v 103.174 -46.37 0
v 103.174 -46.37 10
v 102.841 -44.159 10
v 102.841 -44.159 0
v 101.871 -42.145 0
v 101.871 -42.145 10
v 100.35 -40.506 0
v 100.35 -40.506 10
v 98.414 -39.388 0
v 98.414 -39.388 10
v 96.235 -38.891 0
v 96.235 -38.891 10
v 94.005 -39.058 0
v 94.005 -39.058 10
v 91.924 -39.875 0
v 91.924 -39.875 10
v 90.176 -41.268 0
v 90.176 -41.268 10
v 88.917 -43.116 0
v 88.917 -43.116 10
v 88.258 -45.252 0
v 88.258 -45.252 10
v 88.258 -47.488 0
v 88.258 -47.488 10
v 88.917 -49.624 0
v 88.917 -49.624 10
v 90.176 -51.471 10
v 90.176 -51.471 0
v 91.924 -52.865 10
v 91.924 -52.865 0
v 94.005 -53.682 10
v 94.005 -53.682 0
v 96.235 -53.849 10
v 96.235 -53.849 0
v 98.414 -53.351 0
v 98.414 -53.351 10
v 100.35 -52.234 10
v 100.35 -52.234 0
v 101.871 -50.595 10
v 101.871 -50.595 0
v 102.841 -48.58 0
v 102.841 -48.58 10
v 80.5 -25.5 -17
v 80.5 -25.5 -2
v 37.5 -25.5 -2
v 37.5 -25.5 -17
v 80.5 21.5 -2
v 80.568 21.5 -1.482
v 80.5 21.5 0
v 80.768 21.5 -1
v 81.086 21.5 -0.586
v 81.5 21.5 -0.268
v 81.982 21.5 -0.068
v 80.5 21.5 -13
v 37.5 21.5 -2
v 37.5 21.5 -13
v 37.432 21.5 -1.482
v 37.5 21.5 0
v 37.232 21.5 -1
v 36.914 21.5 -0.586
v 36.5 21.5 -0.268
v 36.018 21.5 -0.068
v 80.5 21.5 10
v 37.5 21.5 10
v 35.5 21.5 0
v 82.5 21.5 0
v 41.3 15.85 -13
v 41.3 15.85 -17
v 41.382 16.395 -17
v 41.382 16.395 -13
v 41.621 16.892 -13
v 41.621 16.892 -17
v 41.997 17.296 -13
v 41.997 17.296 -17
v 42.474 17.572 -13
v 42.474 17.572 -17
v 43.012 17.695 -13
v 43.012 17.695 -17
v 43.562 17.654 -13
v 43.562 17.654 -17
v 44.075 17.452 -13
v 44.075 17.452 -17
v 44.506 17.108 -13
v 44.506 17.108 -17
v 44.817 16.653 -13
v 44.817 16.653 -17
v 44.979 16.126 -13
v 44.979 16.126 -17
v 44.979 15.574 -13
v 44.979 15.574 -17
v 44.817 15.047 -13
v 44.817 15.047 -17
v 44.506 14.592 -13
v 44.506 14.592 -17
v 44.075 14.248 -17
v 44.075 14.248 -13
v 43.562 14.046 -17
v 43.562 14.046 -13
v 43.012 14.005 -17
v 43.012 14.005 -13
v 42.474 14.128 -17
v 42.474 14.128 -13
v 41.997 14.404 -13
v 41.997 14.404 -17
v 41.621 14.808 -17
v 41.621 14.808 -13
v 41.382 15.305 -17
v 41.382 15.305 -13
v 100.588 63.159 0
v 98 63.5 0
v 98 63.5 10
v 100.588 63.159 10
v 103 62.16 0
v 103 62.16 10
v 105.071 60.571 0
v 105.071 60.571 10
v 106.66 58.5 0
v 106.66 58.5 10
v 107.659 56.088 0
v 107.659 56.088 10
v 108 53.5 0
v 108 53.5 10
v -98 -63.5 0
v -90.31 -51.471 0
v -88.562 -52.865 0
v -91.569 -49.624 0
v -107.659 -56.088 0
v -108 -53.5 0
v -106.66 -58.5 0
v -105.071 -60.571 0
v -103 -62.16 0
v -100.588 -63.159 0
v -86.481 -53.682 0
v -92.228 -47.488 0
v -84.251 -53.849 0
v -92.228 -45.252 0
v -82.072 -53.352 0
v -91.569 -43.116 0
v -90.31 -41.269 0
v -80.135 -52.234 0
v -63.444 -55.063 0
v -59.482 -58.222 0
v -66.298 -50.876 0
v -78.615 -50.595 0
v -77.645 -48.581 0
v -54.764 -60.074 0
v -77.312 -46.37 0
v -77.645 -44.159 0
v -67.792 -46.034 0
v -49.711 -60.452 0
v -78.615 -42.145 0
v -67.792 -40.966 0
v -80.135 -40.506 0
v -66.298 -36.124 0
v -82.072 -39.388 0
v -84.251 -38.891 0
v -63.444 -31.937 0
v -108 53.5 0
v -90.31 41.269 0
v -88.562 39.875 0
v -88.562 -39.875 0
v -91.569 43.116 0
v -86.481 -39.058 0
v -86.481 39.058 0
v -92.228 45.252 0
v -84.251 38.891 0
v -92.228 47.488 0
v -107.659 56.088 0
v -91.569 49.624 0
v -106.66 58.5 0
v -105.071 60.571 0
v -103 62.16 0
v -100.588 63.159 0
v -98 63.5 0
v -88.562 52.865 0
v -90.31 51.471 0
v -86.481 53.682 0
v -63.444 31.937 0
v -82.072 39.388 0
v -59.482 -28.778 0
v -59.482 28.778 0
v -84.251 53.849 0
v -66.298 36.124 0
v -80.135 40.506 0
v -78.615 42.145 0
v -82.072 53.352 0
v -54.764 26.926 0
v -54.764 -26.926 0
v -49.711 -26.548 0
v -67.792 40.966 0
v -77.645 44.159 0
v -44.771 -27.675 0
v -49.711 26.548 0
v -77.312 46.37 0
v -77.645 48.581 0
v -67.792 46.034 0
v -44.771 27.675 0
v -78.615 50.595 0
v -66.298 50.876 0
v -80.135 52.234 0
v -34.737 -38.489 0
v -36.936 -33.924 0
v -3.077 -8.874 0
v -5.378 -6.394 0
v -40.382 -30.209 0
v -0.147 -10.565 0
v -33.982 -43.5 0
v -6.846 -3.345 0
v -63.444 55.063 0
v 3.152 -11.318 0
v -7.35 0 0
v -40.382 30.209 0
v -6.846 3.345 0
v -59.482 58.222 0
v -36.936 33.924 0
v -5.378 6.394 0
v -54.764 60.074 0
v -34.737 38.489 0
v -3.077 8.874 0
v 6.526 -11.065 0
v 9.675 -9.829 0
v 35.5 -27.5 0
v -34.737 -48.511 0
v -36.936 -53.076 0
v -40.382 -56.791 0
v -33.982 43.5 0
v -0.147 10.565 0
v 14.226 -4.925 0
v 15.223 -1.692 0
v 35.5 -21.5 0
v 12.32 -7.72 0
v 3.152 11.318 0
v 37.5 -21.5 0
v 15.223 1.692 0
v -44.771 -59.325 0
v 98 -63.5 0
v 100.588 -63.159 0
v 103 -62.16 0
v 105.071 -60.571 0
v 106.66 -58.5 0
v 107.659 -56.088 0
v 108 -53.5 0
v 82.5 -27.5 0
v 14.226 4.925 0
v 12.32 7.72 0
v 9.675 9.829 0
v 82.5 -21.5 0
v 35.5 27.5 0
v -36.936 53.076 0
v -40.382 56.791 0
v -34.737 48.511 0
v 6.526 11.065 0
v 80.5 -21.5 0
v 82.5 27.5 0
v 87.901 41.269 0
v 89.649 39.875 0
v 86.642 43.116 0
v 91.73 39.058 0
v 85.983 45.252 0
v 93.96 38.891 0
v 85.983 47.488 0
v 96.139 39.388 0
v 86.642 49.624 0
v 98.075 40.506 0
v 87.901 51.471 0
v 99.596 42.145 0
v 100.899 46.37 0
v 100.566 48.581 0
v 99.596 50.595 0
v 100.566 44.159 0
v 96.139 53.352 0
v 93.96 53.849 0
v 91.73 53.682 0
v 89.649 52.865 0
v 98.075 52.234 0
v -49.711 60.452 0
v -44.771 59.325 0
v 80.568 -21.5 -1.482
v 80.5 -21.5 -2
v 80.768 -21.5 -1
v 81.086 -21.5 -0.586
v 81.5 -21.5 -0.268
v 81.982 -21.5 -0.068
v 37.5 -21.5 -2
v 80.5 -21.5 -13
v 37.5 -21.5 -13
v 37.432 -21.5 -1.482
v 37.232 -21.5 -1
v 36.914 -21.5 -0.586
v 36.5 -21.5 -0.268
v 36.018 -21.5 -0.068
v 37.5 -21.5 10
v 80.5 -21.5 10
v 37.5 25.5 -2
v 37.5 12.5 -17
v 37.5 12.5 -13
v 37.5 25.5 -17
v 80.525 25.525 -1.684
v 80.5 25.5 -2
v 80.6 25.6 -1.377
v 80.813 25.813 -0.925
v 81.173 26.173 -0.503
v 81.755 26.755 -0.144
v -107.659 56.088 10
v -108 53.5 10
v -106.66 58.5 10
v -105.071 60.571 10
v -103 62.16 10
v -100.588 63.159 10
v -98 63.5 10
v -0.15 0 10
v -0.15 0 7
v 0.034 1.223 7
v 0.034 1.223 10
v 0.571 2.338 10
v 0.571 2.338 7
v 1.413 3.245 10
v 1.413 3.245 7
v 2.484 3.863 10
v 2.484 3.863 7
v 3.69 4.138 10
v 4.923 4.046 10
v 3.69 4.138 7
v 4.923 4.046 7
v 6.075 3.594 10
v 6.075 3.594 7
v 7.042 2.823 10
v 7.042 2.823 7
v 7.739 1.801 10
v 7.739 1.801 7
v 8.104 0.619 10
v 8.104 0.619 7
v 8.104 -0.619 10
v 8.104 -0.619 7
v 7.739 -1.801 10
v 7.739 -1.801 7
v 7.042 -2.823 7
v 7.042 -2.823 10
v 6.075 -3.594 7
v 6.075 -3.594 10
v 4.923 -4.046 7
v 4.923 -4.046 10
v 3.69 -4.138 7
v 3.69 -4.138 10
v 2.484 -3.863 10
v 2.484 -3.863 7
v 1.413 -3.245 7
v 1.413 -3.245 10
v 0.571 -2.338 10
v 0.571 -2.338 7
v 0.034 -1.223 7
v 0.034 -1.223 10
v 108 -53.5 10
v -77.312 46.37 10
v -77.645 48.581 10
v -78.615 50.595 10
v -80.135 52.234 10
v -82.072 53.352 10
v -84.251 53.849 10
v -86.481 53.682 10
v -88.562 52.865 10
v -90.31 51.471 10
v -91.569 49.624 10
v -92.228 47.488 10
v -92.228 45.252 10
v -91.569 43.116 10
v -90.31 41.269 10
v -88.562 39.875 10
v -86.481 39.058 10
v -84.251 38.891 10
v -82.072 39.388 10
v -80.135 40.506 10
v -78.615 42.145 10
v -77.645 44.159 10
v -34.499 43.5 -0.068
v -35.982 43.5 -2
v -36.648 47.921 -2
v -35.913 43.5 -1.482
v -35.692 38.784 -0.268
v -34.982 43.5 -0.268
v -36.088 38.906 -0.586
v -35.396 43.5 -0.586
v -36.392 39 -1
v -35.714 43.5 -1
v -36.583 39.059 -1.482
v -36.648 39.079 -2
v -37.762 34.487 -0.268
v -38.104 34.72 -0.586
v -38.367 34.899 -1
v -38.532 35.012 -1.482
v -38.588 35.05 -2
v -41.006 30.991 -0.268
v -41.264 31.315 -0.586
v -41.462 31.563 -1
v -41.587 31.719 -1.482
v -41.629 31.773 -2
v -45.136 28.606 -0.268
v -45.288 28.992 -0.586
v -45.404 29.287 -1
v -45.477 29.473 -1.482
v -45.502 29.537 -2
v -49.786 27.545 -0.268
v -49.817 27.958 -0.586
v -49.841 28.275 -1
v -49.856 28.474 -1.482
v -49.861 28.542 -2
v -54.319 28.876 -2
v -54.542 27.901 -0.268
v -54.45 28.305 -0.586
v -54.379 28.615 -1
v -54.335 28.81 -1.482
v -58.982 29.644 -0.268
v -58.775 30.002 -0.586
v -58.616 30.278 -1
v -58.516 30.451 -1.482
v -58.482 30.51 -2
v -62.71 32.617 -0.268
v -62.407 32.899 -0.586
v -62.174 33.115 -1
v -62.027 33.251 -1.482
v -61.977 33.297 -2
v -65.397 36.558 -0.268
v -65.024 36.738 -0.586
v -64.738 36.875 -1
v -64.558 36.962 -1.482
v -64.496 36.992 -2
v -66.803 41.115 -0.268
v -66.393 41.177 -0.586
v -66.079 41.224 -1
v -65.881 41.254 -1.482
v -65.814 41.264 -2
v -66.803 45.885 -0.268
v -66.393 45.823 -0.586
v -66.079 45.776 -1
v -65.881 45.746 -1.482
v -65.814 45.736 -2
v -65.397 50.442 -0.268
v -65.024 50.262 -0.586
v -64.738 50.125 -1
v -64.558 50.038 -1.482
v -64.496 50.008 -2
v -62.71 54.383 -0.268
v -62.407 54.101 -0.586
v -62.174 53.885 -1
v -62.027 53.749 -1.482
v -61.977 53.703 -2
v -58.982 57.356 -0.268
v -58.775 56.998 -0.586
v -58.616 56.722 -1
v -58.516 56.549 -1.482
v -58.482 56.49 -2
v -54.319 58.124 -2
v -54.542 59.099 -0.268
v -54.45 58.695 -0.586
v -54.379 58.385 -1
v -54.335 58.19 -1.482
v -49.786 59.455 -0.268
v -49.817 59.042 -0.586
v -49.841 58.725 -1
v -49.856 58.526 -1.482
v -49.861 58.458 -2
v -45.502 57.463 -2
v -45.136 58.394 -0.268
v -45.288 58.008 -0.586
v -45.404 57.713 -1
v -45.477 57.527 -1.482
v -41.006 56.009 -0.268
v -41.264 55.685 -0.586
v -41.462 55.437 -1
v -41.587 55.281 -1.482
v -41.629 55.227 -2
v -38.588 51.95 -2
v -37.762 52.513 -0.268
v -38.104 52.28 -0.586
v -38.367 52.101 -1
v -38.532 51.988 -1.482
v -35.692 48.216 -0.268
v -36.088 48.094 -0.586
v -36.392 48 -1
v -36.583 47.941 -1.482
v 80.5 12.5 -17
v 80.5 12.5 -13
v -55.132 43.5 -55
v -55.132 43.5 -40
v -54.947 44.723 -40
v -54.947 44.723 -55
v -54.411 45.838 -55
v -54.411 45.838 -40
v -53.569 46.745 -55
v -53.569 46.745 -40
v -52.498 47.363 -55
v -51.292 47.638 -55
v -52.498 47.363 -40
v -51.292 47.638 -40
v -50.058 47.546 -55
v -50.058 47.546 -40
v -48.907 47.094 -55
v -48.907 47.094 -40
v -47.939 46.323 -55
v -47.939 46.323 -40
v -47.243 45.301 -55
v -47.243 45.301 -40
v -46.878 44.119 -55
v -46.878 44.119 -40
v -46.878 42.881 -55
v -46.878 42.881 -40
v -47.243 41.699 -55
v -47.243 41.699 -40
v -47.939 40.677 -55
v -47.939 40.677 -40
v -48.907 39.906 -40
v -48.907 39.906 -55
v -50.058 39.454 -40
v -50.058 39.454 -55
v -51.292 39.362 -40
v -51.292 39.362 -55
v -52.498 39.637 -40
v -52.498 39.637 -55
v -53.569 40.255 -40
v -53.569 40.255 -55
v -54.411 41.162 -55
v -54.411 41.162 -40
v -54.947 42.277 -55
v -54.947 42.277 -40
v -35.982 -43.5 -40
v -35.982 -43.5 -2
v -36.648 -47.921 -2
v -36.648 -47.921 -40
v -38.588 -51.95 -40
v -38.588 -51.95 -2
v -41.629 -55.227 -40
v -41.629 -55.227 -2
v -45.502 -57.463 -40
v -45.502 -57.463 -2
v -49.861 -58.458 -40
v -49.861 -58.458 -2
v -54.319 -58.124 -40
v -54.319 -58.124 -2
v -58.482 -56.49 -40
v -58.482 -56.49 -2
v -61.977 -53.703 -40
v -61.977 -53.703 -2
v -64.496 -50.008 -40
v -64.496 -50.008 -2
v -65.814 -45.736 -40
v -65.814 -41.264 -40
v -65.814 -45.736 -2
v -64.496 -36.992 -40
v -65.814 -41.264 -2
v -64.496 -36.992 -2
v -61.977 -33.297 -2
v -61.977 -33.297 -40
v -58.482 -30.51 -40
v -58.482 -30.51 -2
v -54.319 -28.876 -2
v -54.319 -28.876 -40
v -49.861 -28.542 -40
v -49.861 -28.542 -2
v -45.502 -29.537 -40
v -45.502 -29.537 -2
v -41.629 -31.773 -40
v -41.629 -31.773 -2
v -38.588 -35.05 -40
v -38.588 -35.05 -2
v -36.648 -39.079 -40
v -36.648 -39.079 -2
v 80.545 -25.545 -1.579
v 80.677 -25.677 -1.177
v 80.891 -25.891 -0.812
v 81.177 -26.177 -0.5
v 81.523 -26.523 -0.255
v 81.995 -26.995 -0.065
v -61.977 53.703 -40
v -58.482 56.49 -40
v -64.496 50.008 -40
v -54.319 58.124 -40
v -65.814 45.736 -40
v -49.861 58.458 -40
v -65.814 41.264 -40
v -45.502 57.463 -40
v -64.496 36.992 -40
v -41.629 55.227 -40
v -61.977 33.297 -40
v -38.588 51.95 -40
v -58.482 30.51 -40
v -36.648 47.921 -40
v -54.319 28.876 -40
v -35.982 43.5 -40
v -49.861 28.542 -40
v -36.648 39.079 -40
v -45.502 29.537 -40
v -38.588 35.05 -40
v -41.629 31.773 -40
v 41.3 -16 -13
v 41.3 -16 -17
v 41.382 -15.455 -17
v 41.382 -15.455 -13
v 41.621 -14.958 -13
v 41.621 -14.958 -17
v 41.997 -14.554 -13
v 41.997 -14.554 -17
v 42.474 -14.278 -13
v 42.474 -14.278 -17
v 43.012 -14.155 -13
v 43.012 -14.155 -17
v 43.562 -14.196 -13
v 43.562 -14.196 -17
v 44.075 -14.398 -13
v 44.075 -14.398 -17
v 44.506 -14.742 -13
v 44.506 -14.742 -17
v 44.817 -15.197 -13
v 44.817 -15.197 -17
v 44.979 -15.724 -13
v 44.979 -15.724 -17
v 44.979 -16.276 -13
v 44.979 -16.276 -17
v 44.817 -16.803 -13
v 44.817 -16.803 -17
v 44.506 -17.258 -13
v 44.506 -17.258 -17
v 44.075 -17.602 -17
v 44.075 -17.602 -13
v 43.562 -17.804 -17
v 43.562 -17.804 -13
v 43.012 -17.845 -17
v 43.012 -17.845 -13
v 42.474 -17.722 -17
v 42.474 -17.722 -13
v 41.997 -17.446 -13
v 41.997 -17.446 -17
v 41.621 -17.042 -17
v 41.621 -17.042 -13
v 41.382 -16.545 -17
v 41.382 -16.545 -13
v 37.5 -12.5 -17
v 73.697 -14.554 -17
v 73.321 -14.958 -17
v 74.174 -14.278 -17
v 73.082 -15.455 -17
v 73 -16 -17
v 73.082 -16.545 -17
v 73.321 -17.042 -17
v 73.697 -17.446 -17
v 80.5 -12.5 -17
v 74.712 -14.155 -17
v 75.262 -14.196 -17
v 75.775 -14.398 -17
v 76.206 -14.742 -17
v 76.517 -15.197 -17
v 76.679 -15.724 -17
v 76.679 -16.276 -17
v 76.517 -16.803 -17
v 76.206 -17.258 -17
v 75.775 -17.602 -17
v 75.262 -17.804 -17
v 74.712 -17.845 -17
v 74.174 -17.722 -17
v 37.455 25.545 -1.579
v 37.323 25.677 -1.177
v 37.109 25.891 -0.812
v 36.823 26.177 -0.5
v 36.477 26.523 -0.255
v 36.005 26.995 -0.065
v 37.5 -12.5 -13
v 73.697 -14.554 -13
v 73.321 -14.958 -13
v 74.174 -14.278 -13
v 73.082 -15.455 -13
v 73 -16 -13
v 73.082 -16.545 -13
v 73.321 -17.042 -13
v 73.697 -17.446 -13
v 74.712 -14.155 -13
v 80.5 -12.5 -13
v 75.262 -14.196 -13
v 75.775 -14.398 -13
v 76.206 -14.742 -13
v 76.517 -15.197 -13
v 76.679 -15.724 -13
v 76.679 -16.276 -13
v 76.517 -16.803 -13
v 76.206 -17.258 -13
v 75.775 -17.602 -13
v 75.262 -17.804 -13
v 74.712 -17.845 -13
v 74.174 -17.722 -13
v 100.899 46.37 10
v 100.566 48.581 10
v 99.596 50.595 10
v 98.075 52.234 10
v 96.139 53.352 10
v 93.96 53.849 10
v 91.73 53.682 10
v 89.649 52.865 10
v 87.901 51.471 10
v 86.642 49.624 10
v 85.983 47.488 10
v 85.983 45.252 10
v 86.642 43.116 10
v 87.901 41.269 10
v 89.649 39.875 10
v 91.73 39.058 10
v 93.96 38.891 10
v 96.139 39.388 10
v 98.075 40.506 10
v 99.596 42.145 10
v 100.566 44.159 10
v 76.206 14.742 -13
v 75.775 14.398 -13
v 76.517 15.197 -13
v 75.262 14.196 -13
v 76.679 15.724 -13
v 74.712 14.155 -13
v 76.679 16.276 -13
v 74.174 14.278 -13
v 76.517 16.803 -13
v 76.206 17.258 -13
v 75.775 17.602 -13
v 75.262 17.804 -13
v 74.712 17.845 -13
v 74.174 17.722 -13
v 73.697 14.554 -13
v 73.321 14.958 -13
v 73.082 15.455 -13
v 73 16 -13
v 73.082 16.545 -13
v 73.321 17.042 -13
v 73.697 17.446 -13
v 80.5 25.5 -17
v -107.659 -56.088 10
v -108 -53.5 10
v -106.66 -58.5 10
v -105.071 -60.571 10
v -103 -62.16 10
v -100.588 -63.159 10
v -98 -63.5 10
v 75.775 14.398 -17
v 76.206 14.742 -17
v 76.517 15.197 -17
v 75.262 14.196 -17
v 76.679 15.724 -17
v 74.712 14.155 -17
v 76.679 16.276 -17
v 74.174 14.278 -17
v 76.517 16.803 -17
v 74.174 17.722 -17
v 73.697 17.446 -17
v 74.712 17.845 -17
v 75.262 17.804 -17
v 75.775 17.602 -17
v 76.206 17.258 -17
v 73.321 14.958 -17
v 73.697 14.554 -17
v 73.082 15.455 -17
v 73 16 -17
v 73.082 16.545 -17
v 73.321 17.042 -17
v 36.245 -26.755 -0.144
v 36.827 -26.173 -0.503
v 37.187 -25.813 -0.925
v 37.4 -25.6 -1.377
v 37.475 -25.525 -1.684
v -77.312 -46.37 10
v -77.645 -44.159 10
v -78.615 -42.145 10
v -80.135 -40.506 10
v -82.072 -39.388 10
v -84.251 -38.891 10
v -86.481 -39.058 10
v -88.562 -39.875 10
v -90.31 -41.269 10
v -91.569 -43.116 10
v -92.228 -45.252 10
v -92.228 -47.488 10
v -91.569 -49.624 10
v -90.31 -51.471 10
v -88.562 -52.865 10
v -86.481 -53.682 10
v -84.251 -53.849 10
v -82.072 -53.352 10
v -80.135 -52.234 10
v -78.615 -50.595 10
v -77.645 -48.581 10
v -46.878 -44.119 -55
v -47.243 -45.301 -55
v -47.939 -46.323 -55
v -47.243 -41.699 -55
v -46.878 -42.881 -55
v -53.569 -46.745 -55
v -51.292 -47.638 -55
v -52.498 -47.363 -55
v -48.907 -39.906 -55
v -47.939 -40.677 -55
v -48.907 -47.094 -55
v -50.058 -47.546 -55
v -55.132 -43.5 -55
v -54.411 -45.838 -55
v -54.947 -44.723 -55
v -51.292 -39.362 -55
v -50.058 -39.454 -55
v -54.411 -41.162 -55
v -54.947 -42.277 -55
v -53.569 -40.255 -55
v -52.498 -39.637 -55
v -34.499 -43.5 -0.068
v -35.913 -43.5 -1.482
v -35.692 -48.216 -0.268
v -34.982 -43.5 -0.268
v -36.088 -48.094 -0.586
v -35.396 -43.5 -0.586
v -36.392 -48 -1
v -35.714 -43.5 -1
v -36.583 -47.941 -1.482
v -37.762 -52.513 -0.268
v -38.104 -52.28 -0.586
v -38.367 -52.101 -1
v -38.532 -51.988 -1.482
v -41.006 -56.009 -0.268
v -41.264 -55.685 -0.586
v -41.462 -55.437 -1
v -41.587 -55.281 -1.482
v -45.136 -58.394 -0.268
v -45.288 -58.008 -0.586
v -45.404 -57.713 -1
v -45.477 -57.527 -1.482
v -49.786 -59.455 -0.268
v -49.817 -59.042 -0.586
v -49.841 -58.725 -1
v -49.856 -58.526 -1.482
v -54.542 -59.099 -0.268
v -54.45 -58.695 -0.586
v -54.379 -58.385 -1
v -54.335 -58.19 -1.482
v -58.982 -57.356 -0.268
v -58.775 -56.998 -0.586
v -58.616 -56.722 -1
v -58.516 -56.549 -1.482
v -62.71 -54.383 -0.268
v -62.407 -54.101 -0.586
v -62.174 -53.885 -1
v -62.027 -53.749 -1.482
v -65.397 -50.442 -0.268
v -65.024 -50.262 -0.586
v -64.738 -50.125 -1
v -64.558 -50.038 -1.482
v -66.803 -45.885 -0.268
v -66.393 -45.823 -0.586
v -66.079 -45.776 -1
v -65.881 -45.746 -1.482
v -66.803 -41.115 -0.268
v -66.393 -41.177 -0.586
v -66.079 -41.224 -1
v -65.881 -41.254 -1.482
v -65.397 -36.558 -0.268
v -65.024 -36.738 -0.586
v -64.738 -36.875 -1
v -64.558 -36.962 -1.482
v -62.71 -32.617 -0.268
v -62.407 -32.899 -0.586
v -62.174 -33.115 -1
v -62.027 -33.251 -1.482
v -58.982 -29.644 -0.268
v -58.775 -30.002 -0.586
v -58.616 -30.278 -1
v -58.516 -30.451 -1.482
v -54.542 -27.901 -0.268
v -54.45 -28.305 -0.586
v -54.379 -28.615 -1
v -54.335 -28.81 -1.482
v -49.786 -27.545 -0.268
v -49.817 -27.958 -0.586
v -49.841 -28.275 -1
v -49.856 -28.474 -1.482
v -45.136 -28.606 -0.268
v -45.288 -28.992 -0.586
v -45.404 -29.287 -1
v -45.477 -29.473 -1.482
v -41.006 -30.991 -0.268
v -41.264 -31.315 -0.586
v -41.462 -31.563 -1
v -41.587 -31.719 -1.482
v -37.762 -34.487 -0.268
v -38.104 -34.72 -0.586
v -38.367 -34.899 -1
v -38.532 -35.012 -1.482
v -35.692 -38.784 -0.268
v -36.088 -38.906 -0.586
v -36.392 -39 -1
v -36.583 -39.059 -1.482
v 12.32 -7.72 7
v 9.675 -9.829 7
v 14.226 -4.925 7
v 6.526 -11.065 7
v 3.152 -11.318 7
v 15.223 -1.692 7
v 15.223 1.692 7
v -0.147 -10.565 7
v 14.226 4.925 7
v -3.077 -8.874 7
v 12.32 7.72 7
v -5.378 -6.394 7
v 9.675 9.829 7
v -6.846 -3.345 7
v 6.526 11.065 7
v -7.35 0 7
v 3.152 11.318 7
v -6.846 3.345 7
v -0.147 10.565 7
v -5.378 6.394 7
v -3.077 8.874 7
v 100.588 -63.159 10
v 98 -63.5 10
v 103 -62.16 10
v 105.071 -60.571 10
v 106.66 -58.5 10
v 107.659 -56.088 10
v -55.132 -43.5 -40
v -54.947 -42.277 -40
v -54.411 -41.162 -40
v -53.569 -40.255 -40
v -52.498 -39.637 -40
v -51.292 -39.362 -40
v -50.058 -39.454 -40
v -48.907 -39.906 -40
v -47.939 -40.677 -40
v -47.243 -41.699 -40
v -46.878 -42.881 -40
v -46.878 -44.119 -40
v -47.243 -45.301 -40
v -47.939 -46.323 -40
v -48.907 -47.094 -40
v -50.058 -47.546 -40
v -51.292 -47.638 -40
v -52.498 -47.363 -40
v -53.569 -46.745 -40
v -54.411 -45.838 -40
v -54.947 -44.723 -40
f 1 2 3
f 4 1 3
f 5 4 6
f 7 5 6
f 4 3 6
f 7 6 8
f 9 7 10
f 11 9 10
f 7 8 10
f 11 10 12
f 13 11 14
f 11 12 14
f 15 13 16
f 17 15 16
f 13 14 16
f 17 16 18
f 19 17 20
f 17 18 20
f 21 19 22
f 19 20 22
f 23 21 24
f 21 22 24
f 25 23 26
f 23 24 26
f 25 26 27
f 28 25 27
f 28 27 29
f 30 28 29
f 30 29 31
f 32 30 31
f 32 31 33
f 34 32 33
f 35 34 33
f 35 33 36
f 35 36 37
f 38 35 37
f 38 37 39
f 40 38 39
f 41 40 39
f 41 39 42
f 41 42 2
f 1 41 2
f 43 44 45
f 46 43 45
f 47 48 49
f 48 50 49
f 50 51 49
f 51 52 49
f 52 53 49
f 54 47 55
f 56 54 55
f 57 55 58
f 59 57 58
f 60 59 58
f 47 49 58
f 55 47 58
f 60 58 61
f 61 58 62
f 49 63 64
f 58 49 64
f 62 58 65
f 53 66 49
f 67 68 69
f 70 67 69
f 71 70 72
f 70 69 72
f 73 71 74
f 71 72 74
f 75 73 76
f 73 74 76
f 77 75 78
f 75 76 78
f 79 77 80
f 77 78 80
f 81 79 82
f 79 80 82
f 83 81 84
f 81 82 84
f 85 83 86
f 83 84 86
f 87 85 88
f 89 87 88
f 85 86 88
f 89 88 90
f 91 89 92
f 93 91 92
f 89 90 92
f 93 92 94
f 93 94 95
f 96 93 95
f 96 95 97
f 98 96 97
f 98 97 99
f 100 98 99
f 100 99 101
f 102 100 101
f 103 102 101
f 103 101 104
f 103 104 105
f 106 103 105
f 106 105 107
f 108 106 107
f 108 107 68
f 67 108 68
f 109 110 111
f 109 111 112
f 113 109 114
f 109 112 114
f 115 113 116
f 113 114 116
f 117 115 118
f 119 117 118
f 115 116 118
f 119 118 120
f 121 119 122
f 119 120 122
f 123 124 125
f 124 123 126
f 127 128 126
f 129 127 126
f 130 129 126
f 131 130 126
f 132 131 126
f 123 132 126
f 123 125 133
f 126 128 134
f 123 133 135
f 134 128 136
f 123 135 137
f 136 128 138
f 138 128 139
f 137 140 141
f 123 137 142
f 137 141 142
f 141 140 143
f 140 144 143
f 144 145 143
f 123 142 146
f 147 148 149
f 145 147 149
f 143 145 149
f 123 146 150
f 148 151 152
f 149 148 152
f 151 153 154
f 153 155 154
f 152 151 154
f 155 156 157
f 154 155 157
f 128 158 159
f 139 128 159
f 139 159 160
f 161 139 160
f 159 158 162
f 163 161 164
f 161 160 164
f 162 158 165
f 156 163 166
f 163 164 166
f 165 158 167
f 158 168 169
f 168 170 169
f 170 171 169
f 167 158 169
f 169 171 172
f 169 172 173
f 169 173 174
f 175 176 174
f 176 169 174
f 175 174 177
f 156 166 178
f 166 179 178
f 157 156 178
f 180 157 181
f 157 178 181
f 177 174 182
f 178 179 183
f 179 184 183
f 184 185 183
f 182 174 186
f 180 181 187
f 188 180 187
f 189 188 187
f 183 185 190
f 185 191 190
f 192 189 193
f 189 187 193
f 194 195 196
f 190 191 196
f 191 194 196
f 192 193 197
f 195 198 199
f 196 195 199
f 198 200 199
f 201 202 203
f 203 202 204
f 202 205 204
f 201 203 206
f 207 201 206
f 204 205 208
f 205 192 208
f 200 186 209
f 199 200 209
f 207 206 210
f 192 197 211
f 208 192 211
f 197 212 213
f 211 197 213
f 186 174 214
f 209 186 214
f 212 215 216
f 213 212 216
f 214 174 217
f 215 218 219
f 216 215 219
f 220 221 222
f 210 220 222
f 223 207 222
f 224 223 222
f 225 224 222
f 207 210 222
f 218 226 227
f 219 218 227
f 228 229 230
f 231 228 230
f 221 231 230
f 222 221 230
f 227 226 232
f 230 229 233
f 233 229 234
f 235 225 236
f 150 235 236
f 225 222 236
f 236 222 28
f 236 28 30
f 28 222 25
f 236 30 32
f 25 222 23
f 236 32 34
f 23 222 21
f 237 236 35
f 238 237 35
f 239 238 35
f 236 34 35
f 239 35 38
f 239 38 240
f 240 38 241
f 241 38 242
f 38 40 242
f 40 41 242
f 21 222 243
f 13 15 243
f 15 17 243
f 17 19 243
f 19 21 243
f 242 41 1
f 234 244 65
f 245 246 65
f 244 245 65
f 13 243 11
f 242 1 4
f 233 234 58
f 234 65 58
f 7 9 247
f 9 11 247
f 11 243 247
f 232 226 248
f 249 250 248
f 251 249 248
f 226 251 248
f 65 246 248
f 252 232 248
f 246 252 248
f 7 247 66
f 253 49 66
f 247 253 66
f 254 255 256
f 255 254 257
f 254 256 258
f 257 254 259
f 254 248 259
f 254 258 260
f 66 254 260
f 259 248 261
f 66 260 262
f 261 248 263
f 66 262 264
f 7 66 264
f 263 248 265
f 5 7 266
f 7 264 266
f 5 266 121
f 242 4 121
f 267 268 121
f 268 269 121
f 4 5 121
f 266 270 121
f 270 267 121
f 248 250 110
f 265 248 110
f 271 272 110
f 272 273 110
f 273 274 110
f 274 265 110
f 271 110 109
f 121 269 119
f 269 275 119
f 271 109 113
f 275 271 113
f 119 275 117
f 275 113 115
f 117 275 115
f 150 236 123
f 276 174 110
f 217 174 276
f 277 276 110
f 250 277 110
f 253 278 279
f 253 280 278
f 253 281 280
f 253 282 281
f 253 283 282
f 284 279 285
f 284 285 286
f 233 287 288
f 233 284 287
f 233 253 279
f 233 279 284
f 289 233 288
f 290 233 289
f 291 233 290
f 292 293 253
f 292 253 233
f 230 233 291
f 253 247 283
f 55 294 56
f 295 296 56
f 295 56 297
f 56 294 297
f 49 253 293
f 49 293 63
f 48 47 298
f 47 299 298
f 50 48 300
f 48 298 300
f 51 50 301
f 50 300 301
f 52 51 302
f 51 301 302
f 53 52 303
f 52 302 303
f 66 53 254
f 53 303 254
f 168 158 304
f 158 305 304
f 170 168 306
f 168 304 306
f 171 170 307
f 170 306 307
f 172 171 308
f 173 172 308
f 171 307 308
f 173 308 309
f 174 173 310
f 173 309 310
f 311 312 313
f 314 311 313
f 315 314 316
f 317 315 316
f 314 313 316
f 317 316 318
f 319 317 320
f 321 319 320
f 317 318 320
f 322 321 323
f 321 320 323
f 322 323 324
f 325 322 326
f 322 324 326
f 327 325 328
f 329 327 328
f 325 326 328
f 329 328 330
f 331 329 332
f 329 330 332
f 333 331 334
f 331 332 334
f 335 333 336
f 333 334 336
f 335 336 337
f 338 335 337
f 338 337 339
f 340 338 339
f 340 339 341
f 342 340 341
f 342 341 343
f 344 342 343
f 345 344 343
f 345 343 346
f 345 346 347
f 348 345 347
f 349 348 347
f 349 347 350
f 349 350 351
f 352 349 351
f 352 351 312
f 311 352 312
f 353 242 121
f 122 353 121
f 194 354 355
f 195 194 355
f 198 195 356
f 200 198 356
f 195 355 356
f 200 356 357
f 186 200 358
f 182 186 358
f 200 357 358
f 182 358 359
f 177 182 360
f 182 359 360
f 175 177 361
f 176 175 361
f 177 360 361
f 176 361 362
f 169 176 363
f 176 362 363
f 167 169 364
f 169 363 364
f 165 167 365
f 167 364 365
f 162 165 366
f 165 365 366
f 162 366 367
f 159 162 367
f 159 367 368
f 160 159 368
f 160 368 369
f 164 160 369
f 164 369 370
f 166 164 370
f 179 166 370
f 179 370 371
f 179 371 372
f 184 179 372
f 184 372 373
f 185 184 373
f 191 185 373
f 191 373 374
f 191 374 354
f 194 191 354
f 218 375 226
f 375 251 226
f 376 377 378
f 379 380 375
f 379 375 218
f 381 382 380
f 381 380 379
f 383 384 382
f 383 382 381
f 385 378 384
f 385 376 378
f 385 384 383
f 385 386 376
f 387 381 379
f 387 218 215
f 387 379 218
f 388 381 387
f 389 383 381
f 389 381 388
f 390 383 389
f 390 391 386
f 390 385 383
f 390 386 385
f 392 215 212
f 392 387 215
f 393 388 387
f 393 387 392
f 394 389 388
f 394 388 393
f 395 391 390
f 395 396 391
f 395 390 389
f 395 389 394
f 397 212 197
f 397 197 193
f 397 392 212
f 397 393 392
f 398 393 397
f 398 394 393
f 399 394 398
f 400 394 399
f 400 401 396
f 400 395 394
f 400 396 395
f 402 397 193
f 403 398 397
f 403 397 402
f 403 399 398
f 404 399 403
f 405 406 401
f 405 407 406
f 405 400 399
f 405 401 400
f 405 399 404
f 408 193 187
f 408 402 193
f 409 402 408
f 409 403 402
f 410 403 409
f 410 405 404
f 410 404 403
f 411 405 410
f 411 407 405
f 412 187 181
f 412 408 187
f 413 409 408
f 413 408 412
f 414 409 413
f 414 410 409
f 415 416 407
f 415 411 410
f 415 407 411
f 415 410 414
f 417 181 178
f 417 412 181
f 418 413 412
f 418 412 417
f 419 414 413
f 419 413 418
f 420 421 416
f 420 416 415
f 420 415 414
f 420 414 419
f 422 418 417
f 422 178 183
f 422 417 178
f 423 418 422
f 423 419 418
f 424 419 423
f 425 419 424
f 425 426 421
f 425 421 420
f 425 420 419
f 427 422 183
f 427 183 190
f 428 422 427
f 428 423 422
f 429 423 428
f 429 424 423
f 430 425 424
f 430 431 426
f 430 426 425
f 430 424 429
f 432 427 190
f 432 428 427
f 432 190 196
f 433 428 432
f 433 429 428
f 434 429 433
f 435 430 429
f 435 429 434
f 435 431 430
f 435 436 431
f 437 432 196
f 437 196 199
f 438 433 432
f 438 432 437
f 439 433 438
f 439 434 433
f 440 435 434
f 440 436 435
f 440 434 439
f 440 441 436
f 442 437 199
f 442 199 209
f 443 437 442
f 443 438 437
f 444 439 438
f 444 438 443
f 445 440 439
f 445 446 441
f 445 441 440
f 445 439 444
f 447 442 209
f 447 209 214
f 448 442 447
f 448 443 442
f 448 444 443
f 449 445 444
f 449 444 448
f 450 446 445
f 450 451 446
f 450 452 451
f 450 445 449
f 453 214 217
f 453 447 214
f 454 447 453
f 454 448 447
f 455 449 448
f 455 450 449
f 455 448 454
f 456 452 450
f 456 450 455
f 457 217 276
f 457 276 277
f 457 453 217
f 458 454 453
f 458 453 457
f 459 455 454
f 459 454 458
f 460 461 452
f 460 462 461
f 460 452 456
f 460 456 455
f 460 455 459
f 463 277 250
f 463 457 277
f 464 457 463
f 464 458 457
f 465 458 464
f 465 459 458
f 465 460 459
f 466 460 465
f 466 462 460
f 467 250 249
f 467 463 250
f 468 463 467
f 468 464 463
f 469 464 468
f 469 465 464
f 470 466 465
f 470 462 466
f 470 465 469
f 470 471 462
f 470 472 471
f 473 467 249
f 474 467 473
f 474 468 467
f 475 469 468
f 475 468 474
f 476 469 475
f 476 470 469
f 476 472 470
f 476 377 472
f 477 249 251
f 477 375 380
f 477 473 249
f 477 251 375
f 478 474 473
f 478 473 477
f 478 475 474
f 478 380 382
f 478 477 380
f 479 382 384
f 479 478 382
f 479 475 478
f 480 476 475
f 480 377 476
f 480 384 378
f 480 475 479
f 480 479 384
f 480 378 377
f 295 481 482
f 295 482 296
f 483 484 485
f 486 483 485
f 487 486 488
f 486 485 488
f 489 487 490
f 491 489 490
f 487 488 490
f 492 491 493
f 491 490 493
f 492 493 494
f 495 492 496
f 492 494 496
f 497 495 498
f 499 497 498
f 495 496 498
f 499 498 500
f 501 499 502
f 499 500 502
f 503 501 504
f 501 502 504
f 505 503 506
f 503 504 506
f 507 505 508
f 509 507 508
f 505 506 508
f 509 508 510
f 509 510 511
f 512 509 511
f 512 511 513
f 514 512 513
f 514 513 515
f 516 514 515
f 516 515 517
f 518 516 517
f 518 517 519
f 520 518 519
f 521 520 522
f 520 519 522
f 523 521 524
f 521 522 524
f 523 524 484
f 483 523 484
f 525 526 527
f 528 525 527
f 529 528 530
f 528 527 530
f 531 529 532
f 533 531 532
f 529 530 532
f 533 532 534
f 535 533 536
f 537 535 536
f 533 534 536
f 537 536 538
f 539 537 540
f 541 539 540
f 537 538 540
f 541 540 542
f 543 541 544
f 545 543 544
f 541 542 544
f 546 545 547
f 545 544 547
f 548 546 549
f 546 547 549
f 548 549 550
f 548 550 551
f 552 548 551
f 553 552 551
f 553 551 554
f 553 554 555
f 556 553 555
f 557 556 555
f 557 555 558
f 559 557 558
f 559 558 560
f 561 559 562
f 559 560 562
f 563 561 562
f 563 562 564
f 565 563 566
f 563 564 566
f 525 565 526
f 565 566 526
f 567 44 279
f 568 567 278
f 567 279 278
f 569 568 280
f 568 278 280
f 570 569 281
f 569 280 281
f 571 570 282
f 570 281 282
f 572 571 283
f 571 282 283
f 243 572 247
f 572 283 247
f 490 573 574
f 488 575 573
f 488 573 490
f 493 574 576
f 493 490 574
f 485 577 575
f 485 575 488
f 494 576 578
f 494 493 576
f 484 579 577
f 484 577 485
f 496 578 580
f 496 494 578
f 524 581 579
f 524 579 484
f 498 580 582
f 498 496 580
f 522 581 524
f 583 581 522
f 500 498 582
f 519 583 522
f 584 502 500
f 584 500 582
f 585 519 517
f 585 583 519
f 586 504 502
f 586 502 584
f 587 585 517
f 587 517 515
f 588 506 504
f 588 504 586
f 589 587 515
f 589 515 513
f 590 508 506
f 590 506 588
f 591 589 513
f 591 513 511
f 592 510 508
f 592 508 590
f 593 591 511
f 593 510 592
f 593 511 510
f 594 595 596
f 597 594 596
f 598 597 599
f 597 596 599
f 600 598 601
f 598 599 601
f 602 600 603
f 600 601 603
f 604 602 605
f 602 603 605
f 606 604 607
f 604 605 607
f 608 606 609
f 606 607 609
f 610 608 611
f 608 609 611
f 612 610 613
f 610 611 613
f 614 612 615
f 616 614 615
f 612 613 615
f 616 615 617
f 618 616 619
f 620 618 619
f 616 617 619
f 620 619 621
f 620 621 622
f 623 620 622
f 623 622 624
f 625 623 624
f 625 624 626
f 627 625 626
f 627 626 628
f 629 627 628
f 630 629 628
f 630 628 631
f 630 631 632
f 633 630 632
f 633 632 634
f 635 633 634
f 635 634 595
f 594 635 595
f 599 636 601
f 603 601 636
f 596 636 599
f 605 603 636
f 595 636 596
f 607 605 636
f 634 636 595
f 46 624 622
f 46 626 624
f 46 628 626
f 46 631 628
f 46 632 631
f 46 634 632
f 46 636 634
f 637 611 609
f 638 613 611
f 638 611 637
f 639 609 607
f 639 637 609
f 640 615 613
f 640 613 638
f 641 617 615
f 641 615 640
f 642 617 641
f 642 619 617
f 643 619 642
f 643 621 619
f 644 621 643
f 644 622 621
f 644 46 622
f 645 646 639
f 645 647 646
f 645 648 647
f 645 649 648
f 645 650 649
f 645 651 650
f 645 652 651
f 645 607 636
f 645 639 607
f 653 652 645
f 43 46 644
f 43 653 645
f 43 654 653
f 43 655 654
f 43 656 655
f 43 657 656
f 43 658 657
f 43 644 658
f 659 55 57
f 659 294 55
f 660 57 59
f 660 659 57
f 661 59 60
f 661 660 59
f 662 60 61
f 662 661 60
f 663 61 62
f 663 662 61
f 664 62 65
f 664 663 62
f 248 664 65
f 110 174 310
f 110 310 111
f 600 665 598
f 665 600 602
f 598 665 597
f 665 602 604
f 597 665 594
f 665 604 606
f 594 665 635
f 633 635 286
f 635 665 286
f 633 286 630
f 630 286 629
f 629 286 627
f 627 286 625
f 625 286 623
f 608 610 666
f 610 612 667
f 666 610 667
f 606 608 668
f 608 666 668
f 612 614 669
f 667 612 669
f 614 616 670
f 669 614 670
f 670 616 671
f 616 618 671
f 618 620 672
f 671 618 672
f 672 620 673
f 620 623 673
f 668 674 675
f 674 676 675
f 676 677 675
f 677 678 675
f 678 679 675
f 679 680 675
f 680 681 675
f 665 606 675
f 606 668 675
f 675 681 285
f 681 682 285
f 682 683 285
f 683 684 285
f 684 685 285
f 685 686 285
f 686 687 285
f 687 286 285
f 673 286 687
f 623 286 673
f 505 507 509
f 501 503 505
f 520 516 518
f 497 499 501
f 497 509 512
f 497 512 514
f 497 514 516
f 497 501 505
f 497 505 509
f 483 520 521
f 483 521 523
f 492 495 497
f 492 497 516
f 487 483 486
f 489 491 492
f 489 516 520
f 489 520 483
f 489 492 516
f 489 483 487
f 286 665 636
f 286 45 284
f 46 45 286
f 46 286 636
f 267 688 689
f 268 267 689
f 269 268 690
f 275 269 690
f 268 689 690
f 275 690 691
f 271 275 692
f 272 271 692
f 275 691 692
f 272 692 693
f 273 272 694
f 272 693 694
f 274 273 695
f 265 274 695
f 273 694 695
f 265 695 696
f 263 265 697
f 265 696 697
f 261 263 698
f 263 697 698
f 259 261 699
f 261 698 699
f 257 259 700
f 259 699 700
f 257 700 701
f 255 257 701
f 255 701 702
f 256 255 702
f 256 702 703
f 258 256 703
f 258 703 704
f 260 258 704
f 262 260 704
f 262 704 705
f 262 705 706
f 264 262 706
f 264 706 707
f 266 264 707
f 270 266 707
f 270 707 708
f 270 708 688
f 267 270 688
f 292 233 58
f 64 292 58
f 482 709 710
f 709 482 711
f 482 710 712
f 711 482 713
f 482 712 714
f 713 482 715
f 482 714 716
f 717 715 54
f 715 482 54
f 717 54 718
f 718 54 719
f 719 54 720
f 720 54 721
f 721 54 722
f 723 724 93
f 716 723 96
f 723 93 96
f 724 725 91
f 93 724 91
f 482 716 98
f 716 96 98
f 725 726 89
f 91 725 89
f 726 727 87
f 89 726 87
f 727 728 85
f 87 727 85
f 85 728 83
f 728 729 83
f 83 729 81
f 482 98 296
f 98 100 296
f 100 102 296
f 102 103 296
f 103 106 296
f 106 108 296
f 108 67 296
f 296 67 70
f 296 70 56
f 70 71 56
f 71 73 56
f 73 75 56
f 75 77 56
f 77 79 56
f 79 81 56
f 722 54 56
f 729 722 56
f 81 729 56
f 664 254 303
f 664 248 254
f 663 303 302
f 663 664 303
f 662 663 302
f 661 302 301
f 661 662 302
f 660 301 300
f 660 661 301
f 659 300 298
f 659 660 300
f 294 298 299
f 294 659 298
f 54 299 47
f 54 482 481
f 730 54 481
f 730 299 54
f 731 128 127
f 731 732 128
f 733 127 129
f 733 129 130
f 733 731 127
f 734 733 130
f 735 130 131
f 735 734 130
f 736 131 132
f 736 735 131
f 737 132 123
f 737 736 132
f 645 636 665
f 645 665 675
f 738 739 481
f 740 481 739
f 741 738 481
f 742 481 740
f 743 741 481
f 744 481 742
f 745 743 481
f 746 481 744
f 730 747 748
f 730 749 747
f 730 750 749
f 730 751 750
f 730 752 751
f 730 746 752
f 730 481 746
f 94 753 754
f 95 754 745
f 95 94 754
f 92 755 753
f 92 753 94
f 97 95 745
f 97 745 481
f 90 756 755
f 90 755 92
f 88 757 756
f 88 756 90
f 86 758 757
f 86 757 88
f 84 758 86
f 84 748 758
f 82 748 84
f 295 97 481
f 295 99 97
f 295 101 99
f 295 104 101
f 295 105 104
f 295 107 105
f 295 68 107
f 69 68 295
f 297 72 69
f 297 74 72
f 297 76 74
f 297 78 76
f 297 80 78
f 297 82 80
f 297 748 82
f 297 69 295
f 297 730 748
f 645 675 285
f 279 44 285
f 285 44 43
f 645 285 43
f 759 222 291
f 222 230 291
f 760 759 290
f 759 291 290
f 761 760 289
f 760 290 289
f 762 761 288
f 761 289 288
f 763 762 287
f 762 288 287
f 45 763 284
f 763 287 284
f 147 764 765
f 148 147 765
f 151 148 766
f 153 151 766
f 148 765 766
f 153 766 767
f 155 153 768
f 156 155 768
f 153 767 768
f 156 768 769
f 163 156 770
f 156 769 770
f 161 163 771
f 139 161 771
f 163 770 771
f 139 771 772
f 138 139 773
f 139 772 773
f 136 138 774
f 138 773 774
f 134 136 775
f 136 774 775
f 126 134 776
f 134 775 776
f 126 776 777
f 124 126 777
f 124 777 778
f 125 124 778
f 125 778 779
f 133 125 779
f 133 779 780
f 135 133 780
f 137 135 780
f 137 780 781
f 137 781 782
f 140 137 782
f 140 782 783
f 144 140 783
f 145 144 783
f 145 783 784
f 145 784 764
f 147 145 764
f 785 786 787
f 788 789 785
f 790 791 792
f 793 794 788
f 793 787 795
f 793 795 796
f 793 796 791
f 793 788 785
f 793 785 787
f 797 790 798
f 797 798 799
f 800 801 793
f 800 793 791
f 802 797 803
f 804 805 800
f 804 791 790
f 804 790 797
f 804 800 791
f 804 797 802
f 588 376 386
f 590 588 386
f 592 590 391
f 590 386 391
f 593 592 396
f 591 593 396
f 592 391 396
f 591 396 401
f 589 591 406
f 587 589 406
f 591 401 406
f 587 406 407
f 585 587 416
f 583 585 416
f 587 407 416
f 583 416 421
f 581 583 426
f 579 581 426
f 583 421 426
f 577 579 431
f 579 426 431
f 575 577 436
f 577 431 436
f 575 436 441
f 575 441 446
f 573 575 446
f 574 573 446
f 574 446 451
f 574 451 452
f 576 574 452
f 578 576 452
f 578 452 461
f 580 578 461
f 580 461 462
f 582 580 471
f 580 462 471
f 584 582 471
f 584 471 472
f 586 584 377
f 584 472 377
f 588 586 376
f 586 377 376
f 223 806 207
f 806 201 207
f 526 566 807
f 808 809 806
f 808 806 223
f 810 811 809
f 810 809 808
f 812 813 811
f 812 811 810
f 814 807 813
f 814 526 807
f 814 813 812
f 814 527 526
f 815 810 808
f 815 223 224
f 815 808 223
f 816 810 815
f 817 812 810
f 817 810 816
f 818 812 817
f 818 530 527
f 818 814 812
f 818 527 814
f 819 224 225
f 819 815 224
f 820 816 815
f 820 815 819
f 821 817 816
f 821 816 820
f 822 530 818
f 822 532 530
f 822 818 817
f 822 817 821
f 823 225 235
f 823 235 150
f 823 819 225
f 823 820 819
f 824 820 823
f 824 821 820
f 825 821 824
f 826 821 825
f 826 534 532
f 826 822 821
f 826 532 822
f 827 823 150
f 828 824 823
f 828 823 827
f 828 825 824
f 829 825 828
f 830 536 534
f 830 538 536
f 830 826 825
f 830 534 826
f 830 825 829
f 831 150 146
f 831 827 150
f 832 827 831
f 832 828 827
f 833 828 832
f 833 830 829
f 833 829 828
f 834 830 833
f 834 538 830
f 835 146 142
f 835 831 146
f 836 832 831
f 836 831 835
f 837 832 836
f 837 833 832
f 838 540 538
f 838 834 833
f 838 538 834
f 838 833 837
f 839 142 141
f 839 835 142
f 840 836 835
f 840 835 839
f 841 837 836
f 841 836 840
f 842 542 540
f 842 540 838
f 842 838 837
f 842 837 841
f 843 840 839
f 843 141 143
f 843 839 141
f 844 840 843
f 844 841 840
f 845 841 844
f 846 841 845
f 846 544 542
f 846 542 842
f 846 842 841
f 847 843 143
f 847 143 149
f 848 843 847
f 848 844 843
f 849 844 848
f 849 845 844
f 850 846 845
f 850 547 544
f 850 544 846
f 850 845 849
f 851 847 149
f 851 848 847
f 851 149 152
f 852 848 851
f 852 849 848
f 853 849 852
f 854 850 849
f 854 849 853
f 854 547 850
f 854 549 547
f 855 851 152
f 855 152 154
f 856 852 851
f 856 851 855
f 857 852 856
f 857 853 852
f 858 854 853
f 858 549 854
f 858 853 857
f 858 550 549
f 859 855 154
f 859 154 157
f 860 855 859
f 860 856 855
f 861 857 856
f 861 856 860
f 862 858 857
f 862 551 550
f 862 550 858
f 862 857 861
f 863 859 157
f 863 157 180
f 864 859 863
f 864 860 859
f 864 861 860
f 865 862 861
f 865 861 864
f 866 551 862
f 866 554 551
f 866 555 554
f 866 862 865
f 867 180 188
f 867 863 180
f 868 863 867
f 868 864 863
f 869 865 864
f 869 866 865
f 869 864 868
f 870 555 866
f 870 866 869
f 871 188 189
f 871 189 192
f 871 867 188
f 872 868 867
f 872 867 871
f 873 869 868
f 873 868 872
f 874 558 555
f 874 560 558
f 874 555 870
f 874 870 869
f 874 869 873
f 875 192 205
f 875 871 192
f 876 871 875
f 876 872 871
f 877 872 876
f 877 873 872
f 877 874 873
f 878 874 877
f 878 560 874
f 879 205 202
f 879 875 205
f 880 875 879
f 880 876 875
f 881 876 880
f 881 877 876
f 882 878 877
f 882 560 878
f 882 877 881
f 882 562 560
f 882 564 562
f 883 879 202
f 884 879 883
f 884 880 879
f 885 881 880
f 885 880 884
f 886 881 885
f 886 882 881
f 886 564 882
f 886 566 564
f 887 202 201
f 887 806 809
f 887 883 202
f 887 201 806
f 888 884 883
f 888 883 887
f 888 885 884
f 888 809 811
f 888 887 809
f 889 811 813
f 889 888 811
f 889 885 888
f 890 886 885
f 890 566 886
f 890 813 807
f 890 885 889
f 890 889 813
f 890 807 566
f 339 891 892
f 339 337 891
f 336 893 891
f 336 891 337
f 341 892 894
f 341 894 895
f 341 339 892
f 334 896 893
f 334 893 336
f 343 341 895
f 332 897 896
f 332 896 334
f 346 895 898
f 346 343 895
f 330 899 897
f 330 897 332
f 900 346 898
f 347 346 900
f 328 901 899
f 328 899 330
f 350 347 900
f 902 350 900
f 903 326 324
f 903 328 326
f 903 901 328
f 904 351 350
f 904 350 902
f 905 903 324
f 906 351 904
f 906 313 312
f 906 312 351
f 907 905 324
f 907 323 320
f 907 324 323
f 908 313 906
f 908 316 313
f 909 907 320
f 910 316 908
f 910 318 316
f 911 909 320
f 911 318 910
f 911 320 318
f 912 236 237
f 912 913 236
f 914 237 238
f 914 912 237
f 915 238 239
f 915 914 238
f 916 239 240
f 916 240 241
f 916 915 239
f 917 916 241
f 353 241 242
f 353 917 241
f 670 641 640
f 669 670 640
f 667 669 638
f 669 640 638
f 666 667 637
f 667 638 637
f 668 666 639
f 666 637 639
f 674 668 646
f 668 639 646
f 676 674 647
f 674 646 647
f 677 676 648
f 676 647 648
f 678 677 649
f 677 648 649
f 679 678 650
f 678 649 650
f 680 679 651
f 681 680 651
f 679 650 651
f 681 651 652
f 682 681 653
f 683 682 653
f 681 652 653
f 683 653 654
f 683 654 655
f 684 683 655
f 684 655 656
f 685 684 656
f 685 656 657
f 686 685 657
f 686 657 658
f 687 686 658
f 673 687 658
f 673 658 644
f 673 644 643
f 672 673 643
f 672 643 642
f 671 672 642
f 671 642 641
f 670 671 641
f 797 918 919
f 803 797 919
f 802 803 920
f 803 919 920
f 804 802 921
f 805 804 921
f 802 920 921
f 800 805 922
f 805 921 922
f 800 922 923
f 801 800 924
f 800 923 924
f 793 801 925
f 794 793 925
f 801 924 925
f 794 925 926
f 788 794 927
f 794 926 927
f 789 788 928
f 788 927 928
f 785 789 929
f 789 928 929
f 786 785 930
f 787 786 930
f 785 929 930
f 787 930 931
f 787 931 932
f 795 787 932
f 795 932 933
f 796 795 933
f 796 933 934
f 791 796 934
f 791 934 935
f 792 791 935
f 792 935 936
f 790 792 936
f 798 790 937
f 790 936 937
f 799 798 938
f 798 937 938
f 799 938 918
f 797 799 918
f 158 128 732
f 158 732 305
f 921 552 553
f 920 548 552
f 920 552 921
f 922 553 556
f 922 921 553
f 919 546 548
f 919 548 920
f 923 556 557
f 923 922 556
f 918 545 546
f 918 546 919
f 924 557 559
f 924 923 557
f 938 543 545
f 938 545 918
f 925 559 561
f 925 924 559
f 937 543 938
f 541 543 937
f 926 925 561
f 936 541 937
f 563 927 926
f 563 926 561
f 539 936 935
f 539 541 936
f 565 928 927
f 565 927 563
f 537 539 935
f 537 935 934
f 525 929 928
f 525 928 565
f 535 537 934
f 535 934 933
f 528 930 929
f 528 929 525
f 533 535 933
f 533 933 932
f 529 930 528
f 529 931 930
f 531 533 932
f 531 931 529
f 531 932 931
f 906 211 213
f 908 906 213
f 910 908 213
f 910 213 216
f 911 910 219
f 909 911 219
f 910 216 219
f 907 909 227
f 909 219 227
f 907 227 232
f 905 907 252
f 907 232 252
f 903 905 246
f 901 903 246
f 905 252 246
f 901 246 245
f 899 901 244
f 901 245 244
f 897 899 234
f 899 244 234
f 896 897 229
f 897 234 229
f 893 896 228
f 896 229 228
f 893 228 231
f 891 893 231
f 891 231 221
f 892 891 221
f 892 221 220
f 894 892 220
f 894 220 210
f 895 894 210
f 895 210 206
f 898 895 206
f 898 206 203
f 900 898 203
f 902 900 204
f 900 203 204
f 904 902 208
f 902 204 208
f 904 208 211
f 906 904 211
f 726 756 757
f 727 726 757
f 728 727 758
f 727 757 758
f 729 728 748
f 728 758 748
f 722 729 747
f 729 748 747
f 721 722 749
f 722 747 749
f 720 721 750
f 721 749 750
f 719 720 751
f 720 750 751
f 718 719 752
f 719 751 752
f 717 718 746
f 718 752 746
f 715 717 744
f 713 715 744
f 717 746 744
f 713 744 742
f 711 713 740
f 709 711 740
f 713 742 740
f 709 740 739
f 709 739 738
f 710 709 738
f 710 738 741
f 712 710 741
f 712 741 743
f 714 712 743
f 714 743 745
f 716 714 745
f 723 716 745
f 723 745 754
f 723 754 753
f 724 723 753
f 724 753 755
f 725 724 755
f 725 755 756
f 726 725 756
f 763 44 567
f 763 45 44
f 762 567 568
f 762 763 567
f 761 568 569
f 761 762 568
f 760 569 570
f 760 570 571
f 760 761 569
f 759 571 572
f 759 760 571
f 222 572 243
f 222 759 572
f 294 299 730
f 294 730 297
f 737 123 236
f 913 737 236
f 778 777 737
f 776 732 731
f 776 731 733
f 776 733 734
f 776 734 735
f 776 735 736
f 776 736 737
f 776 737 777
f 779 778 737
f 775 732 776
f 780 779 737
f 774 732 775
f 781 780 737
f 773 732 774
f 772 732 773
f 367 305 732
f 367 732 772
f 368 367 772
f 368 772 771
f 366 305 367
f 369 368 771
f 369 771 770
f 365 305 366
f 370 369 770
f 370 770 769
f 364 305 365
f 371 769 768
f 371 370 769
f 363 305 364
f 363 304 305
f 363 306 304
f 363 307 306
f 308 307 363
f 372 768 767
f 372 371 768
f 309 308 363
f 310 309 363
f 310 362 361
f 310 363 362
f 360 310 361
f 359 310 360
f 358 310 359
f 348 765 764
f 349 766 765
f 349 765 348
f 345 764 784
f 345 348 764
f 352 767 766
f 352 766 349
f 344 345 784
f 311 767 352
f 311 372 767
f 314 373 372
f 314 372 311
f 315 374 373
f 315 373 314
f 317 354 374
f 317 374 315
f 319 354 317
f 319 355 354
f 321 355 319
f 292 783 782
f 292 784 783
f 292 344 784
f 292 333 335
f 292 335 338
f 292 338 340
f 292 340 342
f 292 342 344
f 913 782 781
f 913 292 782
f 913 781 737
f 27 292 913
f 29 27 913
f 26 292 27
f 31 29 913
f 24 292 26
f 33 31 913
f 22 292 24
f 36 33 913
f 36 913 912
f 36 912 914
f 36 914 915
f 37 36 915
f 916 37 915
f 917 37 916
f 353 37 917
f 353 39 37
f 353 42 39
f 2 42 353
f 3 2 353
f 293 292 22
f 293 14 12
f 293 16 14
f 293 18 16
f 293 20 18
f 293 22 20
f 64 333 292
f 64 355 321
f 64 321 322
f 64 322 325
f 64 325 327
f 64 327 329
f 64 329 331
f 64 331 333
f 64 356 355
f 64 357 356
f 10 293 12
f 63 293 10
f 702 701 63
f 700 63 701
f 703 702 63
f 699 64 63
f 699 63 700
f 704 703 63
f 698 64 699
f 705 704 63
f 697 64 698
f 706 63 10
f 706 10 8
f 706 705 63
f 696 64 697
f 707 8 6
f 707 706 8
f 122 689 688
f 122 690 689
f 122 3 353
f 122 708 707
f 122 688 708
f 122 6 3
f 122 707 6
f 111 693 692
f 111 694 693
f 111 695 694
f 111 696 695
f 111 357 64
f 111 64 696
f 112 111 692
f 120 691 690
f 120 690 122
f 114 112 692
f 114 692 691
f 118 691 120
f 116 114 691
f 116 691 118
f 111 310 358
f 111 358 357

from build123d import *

# Parameters (mm, degrees)
SKETCH1_W            = 216
SKETCH1_H            = 127
BOSS_EXTRUDE1_DEPTH  = 10
FILLET1_R            = 10
FILLET2_R            = 10
SKETCH9_R            = 11.35
CUT_EXTRUDE4_DEPTH   = 7
SKETCH12_R           = 4.15
CUT_EXTRUDE5_DEPTH   = 7
SKETCH9_4_W          = 43
SKETCH9_4_H          = 43
CUT_EXTRUDE6_DEPTH   = 126.683133315
SKETCH13_W           = 43
SKETCH13_H           = 4
BOSS_EXTRUDE2_DEPTH  = 17
FILLET4_R            = 2
SKETCH17_W           = 43
SKETCH17_H           = 4
BOSS_EXTRUDE5_DEPTH  = 9
SKETCH18_W           = 43
SKETCH18_H           = 4
BOSS_EXTRUDE6_DEPTH  = 17
SKETCH19_W           = 43
SKETCH19_H           = 4
BOSS_EXTRUDE7_DEPTH  = 9
FILLET5_R            = 2
SKETCH20_R           = 1.85
CUT_EXTRUDE7_DEPTH   = 9
SKETCH23_R           = 1.85
CUT_EXTRUDE8_DEPTH   = 9
SKETCH25_R           = 15
BOSS_EXTRUDE9_DEPTH  = 40
SKETCH26_R           = 4.15
BOSS_EXTRUDE10_DEPTH = 15
SKETCH27_R           = 4.15
BOSS_EXTRUDE11_DEPTH = 15
FILLET9_R            = 2
FILLET10_R           = 2
SKETCH28_R           = 7.5
CUT_EXTRUDE9_DEPTH   = 142.142658328


with BuildPart() as part:
    # Sketch1 → Boss-Extrude1 (new body)
    with BuildSketch(Plane.XY):
        Rectangle(SKETCH1_W, SKETCH1_H)
    extrude(amount=BOSS_EXTRUDE1_DEPTH)

    # Fillet1
    fillet1_edges = [part.edges().sort_by_distance(p)[0] for p in [
        (-108, 63.5, 5),
    ]]
    fillet(fillet1_edges, radius=FILLET1_R)

    # Fillet2
    fillet2_edges = [part.edges().sort_by_distance(p)[0] for p in [
        (-108, -63.5, 5),
        (108, 63.5, 5),
        (108, -63.5, 5),
    ]]
    fillet(fillet2_edges, radius=FILLET2_R)

    # Sketch9 → Cut-Extrude4 (cut)
    with BuildSketch(Plane(origin=(0, 0, 0), x_dir=(-1, 0, 0), z_dir=(0, 0, -1))):
        with Locations((-4, 0)):
            Circle(SKETCH9_R)
    extrude(amount=-CUT_EXTRUDE4_DEPTH, mode=Mode.SUBTRACT)

    # Sketch12 → Cut-Extrude5 (cut)
    with BuildSketch(Plane(origin=(0, 0, 7), x_dir=(-1, 0, 0), z_dir=(0, 0, -1))):
        with Locations((-4, 0)):
            Circle(SKETCH12_R)
    extrude(amount=-CUT_EXTRUDE5_DEPTH, mode=Mode.SUBTRACT)

    # Sketch9<4> → Cut-Extrude6 (cut, through all)
    with BuildSketch(Plane(origin=(0, 0, 0), x_dir=(-1, 0, 0), z_dir=(0, 0, -1))):
        with Locations((-59, 0)):
            Rectangle(SKETCH9_4_W, SKETCH9_4_H)
    extrude(amount=-CUT_EXTRUDE6_DEPTH, mode=Mode.SUBTRACT)

    # Sketch13 → Boss-Extrude2 (add)
    with BuildSketch(Plane(origin=(0, 0, 0), x_dir=(-1, 0, 0), z_dir=(0, 0, -1))):
        with Locations((-59, -23.5)):
            Rectangle(SKETCH13_W, SKETCH13_H)
    extrude(amount=BOSS_EXTRUDE2_DEPTH)

    # Fillet4
    fillet4_edges = [part.edges().sort_by_distance(p)[0] for p in [
        (59, -25.5, 0),
        (37.5, -23.5, 0),
        (80.5, -23.5, 0),
    ]]
    fillet(fillet4_edges, radius=FILLET4_R)

    # Sketch17 → Boss-Extrude5 (add)
    with BuildSketch(Plane(origin=(0, -21.5, 0), x_dir=(1, 0, 0), z_dir=(0, 1, 0))):
        with Locations((59, 15)):
            Rectangle(SKETCH17_W, SKETCH17_H)
    extrude(amount=BOSS_EXTRUDE5_DEPTH)

    # Sketch18 → Boss-Extrude6 (add)
    with BuildSketch(Plane(origin=(0, 0, 0), x_dir=(-1, 0, 0), z_dir=(0, 0, -1))):
        with Locations((-59, 23.5)):
            Rectangle(SKETCH18_W, SKETCH18_H)
    extrude(amount=BOSS_EXTRUDE6_DEPTH)

    # Sketch19 → Boss-Extrude7 (add)
    with BuildSketch(Plane(origin=(0, 21.5, 0), x_dir=(-1, 0, 0), z_dir=(0, -1, 0))):
        with Locations((-59, 15)):
            Rectangle(SKETCH19_W, SKETCH19_H)
    extrude(amount=BOSS_EXTRUDE7_DEPTH)

    # Fillet5
    fillet5_edges = [part.edges().sort_by_distance(p)[0] for p in [
        (37.5, 23.5, 0),
        (80.5, 23.5, 0),
        (59, 25.5, 0),
    ]]
    fillet(fillet5_edges, radius=FILLET5_R)

    # Sketch20 → Cut-Extrude7 (cut)
    with BuildSketch(Plane(origin=(0, 0, -17), x_dir=(-1, 0, 0), z_dir=(0, 0, -1))):
        with Locations((-43.15, -16)):
            Circle(SKETCH20_R)
        with Locations((-74.85, -16)):
            Circle(SKETCH20_R)
    extrude(amount=-CUT_EXTRUDE7_DEPTH, mode=Mode.SUBTRACT)

    # Sketch23 → Cut-Extrude8 (cut)
    with BuildSketch(Plane(origin=(0, 0, -17), x_dir=(-1, 0, 0), z_dir=(0, 0, -1))):
        with Locations((-43.15, 15.85)):
            Circle(SKETCH23_R)
        with Locations((-74.85, 16)):
            Circle(SKETCH23_R)
    extrude(amount=-CUT_EXTRUDE8_DEPTH, mode=Mode.SUBTRACT)

    # Sketch25 → Boss-Extrude9 (add)
    with BuildSketch(Plane(origin=(0, 0, 0), x_dir=(-1, 0, 0), z_dir=(0, 0, -1))):
        with Locations((50.981638517, -43.5)):
            Circle(SKETCH25_R)
        with Locations((50.981638517, 43.5)):
            Circle(SKETCH25_R)
    extrude(amount=BOSS_EXTRUDE9_DEPTH)

    # Sketch26 → Boss-Extrude10 (add)
    with BuildSketch(Plane(origin=(0, 0, -40), x_dir=(-1, 0, 0), z_dir=(0, 0, -1))):
        with Locations((50.981638517, -43.5)):
            Circle(SKETCH26_R)
    extrude(amount=BOSS_EXTRUDE10_DEPTH)

    # Sketch27 → Boss-Extrude11 (add)
    with BuildSketch(Plane(origin=(0, 0, -40), x_dir=(-1, 0, 0), z_dir=(0, 0, -1))):
        with Locations((50.981638517, 43.5)):
            Circle(SKETCH27_R)
    extrude(amount=BOSS_EXTRUDE11_DEPTH)

    # Fillet9
    fillet9_edges = [part.edges().sort_by_distance(p)[0] for p in [
        (-35.981638517, -43.5, 0),
    ]]
    fillet(fillet9_edges, radius=FILLET9_R)

    # Fillet10
    fillet10_edges = [part.edges().sort_by_distance(p)[0] for p in [
        (-35.981638517, 43.5, 0),
    ]]
    fillet(fillet10_edges, radius=FILLET10_R)

    # Sketch28 → Cut-Extrude9 (cut, through all)
    with BuildSketch(Plane.XY.offset(10)):
        with Locations((-84.811667967, 46.37)):
            Circle(SKETCH28_R)
        with Locations((-84.811667967, -46.37)):
            Circle(SKETCH28_R)
        with Locations((95.674047271, -46.369786546)):
            Circle(SKETCH28_R)
        with Locations((93.399057455, 46.37)):
            Circle(SKETCH28_R)
    extrude(amount=-CUT_EXTRUDE9_DEPTH, mode=Mode.SUBTRACT)


solid = part.part
